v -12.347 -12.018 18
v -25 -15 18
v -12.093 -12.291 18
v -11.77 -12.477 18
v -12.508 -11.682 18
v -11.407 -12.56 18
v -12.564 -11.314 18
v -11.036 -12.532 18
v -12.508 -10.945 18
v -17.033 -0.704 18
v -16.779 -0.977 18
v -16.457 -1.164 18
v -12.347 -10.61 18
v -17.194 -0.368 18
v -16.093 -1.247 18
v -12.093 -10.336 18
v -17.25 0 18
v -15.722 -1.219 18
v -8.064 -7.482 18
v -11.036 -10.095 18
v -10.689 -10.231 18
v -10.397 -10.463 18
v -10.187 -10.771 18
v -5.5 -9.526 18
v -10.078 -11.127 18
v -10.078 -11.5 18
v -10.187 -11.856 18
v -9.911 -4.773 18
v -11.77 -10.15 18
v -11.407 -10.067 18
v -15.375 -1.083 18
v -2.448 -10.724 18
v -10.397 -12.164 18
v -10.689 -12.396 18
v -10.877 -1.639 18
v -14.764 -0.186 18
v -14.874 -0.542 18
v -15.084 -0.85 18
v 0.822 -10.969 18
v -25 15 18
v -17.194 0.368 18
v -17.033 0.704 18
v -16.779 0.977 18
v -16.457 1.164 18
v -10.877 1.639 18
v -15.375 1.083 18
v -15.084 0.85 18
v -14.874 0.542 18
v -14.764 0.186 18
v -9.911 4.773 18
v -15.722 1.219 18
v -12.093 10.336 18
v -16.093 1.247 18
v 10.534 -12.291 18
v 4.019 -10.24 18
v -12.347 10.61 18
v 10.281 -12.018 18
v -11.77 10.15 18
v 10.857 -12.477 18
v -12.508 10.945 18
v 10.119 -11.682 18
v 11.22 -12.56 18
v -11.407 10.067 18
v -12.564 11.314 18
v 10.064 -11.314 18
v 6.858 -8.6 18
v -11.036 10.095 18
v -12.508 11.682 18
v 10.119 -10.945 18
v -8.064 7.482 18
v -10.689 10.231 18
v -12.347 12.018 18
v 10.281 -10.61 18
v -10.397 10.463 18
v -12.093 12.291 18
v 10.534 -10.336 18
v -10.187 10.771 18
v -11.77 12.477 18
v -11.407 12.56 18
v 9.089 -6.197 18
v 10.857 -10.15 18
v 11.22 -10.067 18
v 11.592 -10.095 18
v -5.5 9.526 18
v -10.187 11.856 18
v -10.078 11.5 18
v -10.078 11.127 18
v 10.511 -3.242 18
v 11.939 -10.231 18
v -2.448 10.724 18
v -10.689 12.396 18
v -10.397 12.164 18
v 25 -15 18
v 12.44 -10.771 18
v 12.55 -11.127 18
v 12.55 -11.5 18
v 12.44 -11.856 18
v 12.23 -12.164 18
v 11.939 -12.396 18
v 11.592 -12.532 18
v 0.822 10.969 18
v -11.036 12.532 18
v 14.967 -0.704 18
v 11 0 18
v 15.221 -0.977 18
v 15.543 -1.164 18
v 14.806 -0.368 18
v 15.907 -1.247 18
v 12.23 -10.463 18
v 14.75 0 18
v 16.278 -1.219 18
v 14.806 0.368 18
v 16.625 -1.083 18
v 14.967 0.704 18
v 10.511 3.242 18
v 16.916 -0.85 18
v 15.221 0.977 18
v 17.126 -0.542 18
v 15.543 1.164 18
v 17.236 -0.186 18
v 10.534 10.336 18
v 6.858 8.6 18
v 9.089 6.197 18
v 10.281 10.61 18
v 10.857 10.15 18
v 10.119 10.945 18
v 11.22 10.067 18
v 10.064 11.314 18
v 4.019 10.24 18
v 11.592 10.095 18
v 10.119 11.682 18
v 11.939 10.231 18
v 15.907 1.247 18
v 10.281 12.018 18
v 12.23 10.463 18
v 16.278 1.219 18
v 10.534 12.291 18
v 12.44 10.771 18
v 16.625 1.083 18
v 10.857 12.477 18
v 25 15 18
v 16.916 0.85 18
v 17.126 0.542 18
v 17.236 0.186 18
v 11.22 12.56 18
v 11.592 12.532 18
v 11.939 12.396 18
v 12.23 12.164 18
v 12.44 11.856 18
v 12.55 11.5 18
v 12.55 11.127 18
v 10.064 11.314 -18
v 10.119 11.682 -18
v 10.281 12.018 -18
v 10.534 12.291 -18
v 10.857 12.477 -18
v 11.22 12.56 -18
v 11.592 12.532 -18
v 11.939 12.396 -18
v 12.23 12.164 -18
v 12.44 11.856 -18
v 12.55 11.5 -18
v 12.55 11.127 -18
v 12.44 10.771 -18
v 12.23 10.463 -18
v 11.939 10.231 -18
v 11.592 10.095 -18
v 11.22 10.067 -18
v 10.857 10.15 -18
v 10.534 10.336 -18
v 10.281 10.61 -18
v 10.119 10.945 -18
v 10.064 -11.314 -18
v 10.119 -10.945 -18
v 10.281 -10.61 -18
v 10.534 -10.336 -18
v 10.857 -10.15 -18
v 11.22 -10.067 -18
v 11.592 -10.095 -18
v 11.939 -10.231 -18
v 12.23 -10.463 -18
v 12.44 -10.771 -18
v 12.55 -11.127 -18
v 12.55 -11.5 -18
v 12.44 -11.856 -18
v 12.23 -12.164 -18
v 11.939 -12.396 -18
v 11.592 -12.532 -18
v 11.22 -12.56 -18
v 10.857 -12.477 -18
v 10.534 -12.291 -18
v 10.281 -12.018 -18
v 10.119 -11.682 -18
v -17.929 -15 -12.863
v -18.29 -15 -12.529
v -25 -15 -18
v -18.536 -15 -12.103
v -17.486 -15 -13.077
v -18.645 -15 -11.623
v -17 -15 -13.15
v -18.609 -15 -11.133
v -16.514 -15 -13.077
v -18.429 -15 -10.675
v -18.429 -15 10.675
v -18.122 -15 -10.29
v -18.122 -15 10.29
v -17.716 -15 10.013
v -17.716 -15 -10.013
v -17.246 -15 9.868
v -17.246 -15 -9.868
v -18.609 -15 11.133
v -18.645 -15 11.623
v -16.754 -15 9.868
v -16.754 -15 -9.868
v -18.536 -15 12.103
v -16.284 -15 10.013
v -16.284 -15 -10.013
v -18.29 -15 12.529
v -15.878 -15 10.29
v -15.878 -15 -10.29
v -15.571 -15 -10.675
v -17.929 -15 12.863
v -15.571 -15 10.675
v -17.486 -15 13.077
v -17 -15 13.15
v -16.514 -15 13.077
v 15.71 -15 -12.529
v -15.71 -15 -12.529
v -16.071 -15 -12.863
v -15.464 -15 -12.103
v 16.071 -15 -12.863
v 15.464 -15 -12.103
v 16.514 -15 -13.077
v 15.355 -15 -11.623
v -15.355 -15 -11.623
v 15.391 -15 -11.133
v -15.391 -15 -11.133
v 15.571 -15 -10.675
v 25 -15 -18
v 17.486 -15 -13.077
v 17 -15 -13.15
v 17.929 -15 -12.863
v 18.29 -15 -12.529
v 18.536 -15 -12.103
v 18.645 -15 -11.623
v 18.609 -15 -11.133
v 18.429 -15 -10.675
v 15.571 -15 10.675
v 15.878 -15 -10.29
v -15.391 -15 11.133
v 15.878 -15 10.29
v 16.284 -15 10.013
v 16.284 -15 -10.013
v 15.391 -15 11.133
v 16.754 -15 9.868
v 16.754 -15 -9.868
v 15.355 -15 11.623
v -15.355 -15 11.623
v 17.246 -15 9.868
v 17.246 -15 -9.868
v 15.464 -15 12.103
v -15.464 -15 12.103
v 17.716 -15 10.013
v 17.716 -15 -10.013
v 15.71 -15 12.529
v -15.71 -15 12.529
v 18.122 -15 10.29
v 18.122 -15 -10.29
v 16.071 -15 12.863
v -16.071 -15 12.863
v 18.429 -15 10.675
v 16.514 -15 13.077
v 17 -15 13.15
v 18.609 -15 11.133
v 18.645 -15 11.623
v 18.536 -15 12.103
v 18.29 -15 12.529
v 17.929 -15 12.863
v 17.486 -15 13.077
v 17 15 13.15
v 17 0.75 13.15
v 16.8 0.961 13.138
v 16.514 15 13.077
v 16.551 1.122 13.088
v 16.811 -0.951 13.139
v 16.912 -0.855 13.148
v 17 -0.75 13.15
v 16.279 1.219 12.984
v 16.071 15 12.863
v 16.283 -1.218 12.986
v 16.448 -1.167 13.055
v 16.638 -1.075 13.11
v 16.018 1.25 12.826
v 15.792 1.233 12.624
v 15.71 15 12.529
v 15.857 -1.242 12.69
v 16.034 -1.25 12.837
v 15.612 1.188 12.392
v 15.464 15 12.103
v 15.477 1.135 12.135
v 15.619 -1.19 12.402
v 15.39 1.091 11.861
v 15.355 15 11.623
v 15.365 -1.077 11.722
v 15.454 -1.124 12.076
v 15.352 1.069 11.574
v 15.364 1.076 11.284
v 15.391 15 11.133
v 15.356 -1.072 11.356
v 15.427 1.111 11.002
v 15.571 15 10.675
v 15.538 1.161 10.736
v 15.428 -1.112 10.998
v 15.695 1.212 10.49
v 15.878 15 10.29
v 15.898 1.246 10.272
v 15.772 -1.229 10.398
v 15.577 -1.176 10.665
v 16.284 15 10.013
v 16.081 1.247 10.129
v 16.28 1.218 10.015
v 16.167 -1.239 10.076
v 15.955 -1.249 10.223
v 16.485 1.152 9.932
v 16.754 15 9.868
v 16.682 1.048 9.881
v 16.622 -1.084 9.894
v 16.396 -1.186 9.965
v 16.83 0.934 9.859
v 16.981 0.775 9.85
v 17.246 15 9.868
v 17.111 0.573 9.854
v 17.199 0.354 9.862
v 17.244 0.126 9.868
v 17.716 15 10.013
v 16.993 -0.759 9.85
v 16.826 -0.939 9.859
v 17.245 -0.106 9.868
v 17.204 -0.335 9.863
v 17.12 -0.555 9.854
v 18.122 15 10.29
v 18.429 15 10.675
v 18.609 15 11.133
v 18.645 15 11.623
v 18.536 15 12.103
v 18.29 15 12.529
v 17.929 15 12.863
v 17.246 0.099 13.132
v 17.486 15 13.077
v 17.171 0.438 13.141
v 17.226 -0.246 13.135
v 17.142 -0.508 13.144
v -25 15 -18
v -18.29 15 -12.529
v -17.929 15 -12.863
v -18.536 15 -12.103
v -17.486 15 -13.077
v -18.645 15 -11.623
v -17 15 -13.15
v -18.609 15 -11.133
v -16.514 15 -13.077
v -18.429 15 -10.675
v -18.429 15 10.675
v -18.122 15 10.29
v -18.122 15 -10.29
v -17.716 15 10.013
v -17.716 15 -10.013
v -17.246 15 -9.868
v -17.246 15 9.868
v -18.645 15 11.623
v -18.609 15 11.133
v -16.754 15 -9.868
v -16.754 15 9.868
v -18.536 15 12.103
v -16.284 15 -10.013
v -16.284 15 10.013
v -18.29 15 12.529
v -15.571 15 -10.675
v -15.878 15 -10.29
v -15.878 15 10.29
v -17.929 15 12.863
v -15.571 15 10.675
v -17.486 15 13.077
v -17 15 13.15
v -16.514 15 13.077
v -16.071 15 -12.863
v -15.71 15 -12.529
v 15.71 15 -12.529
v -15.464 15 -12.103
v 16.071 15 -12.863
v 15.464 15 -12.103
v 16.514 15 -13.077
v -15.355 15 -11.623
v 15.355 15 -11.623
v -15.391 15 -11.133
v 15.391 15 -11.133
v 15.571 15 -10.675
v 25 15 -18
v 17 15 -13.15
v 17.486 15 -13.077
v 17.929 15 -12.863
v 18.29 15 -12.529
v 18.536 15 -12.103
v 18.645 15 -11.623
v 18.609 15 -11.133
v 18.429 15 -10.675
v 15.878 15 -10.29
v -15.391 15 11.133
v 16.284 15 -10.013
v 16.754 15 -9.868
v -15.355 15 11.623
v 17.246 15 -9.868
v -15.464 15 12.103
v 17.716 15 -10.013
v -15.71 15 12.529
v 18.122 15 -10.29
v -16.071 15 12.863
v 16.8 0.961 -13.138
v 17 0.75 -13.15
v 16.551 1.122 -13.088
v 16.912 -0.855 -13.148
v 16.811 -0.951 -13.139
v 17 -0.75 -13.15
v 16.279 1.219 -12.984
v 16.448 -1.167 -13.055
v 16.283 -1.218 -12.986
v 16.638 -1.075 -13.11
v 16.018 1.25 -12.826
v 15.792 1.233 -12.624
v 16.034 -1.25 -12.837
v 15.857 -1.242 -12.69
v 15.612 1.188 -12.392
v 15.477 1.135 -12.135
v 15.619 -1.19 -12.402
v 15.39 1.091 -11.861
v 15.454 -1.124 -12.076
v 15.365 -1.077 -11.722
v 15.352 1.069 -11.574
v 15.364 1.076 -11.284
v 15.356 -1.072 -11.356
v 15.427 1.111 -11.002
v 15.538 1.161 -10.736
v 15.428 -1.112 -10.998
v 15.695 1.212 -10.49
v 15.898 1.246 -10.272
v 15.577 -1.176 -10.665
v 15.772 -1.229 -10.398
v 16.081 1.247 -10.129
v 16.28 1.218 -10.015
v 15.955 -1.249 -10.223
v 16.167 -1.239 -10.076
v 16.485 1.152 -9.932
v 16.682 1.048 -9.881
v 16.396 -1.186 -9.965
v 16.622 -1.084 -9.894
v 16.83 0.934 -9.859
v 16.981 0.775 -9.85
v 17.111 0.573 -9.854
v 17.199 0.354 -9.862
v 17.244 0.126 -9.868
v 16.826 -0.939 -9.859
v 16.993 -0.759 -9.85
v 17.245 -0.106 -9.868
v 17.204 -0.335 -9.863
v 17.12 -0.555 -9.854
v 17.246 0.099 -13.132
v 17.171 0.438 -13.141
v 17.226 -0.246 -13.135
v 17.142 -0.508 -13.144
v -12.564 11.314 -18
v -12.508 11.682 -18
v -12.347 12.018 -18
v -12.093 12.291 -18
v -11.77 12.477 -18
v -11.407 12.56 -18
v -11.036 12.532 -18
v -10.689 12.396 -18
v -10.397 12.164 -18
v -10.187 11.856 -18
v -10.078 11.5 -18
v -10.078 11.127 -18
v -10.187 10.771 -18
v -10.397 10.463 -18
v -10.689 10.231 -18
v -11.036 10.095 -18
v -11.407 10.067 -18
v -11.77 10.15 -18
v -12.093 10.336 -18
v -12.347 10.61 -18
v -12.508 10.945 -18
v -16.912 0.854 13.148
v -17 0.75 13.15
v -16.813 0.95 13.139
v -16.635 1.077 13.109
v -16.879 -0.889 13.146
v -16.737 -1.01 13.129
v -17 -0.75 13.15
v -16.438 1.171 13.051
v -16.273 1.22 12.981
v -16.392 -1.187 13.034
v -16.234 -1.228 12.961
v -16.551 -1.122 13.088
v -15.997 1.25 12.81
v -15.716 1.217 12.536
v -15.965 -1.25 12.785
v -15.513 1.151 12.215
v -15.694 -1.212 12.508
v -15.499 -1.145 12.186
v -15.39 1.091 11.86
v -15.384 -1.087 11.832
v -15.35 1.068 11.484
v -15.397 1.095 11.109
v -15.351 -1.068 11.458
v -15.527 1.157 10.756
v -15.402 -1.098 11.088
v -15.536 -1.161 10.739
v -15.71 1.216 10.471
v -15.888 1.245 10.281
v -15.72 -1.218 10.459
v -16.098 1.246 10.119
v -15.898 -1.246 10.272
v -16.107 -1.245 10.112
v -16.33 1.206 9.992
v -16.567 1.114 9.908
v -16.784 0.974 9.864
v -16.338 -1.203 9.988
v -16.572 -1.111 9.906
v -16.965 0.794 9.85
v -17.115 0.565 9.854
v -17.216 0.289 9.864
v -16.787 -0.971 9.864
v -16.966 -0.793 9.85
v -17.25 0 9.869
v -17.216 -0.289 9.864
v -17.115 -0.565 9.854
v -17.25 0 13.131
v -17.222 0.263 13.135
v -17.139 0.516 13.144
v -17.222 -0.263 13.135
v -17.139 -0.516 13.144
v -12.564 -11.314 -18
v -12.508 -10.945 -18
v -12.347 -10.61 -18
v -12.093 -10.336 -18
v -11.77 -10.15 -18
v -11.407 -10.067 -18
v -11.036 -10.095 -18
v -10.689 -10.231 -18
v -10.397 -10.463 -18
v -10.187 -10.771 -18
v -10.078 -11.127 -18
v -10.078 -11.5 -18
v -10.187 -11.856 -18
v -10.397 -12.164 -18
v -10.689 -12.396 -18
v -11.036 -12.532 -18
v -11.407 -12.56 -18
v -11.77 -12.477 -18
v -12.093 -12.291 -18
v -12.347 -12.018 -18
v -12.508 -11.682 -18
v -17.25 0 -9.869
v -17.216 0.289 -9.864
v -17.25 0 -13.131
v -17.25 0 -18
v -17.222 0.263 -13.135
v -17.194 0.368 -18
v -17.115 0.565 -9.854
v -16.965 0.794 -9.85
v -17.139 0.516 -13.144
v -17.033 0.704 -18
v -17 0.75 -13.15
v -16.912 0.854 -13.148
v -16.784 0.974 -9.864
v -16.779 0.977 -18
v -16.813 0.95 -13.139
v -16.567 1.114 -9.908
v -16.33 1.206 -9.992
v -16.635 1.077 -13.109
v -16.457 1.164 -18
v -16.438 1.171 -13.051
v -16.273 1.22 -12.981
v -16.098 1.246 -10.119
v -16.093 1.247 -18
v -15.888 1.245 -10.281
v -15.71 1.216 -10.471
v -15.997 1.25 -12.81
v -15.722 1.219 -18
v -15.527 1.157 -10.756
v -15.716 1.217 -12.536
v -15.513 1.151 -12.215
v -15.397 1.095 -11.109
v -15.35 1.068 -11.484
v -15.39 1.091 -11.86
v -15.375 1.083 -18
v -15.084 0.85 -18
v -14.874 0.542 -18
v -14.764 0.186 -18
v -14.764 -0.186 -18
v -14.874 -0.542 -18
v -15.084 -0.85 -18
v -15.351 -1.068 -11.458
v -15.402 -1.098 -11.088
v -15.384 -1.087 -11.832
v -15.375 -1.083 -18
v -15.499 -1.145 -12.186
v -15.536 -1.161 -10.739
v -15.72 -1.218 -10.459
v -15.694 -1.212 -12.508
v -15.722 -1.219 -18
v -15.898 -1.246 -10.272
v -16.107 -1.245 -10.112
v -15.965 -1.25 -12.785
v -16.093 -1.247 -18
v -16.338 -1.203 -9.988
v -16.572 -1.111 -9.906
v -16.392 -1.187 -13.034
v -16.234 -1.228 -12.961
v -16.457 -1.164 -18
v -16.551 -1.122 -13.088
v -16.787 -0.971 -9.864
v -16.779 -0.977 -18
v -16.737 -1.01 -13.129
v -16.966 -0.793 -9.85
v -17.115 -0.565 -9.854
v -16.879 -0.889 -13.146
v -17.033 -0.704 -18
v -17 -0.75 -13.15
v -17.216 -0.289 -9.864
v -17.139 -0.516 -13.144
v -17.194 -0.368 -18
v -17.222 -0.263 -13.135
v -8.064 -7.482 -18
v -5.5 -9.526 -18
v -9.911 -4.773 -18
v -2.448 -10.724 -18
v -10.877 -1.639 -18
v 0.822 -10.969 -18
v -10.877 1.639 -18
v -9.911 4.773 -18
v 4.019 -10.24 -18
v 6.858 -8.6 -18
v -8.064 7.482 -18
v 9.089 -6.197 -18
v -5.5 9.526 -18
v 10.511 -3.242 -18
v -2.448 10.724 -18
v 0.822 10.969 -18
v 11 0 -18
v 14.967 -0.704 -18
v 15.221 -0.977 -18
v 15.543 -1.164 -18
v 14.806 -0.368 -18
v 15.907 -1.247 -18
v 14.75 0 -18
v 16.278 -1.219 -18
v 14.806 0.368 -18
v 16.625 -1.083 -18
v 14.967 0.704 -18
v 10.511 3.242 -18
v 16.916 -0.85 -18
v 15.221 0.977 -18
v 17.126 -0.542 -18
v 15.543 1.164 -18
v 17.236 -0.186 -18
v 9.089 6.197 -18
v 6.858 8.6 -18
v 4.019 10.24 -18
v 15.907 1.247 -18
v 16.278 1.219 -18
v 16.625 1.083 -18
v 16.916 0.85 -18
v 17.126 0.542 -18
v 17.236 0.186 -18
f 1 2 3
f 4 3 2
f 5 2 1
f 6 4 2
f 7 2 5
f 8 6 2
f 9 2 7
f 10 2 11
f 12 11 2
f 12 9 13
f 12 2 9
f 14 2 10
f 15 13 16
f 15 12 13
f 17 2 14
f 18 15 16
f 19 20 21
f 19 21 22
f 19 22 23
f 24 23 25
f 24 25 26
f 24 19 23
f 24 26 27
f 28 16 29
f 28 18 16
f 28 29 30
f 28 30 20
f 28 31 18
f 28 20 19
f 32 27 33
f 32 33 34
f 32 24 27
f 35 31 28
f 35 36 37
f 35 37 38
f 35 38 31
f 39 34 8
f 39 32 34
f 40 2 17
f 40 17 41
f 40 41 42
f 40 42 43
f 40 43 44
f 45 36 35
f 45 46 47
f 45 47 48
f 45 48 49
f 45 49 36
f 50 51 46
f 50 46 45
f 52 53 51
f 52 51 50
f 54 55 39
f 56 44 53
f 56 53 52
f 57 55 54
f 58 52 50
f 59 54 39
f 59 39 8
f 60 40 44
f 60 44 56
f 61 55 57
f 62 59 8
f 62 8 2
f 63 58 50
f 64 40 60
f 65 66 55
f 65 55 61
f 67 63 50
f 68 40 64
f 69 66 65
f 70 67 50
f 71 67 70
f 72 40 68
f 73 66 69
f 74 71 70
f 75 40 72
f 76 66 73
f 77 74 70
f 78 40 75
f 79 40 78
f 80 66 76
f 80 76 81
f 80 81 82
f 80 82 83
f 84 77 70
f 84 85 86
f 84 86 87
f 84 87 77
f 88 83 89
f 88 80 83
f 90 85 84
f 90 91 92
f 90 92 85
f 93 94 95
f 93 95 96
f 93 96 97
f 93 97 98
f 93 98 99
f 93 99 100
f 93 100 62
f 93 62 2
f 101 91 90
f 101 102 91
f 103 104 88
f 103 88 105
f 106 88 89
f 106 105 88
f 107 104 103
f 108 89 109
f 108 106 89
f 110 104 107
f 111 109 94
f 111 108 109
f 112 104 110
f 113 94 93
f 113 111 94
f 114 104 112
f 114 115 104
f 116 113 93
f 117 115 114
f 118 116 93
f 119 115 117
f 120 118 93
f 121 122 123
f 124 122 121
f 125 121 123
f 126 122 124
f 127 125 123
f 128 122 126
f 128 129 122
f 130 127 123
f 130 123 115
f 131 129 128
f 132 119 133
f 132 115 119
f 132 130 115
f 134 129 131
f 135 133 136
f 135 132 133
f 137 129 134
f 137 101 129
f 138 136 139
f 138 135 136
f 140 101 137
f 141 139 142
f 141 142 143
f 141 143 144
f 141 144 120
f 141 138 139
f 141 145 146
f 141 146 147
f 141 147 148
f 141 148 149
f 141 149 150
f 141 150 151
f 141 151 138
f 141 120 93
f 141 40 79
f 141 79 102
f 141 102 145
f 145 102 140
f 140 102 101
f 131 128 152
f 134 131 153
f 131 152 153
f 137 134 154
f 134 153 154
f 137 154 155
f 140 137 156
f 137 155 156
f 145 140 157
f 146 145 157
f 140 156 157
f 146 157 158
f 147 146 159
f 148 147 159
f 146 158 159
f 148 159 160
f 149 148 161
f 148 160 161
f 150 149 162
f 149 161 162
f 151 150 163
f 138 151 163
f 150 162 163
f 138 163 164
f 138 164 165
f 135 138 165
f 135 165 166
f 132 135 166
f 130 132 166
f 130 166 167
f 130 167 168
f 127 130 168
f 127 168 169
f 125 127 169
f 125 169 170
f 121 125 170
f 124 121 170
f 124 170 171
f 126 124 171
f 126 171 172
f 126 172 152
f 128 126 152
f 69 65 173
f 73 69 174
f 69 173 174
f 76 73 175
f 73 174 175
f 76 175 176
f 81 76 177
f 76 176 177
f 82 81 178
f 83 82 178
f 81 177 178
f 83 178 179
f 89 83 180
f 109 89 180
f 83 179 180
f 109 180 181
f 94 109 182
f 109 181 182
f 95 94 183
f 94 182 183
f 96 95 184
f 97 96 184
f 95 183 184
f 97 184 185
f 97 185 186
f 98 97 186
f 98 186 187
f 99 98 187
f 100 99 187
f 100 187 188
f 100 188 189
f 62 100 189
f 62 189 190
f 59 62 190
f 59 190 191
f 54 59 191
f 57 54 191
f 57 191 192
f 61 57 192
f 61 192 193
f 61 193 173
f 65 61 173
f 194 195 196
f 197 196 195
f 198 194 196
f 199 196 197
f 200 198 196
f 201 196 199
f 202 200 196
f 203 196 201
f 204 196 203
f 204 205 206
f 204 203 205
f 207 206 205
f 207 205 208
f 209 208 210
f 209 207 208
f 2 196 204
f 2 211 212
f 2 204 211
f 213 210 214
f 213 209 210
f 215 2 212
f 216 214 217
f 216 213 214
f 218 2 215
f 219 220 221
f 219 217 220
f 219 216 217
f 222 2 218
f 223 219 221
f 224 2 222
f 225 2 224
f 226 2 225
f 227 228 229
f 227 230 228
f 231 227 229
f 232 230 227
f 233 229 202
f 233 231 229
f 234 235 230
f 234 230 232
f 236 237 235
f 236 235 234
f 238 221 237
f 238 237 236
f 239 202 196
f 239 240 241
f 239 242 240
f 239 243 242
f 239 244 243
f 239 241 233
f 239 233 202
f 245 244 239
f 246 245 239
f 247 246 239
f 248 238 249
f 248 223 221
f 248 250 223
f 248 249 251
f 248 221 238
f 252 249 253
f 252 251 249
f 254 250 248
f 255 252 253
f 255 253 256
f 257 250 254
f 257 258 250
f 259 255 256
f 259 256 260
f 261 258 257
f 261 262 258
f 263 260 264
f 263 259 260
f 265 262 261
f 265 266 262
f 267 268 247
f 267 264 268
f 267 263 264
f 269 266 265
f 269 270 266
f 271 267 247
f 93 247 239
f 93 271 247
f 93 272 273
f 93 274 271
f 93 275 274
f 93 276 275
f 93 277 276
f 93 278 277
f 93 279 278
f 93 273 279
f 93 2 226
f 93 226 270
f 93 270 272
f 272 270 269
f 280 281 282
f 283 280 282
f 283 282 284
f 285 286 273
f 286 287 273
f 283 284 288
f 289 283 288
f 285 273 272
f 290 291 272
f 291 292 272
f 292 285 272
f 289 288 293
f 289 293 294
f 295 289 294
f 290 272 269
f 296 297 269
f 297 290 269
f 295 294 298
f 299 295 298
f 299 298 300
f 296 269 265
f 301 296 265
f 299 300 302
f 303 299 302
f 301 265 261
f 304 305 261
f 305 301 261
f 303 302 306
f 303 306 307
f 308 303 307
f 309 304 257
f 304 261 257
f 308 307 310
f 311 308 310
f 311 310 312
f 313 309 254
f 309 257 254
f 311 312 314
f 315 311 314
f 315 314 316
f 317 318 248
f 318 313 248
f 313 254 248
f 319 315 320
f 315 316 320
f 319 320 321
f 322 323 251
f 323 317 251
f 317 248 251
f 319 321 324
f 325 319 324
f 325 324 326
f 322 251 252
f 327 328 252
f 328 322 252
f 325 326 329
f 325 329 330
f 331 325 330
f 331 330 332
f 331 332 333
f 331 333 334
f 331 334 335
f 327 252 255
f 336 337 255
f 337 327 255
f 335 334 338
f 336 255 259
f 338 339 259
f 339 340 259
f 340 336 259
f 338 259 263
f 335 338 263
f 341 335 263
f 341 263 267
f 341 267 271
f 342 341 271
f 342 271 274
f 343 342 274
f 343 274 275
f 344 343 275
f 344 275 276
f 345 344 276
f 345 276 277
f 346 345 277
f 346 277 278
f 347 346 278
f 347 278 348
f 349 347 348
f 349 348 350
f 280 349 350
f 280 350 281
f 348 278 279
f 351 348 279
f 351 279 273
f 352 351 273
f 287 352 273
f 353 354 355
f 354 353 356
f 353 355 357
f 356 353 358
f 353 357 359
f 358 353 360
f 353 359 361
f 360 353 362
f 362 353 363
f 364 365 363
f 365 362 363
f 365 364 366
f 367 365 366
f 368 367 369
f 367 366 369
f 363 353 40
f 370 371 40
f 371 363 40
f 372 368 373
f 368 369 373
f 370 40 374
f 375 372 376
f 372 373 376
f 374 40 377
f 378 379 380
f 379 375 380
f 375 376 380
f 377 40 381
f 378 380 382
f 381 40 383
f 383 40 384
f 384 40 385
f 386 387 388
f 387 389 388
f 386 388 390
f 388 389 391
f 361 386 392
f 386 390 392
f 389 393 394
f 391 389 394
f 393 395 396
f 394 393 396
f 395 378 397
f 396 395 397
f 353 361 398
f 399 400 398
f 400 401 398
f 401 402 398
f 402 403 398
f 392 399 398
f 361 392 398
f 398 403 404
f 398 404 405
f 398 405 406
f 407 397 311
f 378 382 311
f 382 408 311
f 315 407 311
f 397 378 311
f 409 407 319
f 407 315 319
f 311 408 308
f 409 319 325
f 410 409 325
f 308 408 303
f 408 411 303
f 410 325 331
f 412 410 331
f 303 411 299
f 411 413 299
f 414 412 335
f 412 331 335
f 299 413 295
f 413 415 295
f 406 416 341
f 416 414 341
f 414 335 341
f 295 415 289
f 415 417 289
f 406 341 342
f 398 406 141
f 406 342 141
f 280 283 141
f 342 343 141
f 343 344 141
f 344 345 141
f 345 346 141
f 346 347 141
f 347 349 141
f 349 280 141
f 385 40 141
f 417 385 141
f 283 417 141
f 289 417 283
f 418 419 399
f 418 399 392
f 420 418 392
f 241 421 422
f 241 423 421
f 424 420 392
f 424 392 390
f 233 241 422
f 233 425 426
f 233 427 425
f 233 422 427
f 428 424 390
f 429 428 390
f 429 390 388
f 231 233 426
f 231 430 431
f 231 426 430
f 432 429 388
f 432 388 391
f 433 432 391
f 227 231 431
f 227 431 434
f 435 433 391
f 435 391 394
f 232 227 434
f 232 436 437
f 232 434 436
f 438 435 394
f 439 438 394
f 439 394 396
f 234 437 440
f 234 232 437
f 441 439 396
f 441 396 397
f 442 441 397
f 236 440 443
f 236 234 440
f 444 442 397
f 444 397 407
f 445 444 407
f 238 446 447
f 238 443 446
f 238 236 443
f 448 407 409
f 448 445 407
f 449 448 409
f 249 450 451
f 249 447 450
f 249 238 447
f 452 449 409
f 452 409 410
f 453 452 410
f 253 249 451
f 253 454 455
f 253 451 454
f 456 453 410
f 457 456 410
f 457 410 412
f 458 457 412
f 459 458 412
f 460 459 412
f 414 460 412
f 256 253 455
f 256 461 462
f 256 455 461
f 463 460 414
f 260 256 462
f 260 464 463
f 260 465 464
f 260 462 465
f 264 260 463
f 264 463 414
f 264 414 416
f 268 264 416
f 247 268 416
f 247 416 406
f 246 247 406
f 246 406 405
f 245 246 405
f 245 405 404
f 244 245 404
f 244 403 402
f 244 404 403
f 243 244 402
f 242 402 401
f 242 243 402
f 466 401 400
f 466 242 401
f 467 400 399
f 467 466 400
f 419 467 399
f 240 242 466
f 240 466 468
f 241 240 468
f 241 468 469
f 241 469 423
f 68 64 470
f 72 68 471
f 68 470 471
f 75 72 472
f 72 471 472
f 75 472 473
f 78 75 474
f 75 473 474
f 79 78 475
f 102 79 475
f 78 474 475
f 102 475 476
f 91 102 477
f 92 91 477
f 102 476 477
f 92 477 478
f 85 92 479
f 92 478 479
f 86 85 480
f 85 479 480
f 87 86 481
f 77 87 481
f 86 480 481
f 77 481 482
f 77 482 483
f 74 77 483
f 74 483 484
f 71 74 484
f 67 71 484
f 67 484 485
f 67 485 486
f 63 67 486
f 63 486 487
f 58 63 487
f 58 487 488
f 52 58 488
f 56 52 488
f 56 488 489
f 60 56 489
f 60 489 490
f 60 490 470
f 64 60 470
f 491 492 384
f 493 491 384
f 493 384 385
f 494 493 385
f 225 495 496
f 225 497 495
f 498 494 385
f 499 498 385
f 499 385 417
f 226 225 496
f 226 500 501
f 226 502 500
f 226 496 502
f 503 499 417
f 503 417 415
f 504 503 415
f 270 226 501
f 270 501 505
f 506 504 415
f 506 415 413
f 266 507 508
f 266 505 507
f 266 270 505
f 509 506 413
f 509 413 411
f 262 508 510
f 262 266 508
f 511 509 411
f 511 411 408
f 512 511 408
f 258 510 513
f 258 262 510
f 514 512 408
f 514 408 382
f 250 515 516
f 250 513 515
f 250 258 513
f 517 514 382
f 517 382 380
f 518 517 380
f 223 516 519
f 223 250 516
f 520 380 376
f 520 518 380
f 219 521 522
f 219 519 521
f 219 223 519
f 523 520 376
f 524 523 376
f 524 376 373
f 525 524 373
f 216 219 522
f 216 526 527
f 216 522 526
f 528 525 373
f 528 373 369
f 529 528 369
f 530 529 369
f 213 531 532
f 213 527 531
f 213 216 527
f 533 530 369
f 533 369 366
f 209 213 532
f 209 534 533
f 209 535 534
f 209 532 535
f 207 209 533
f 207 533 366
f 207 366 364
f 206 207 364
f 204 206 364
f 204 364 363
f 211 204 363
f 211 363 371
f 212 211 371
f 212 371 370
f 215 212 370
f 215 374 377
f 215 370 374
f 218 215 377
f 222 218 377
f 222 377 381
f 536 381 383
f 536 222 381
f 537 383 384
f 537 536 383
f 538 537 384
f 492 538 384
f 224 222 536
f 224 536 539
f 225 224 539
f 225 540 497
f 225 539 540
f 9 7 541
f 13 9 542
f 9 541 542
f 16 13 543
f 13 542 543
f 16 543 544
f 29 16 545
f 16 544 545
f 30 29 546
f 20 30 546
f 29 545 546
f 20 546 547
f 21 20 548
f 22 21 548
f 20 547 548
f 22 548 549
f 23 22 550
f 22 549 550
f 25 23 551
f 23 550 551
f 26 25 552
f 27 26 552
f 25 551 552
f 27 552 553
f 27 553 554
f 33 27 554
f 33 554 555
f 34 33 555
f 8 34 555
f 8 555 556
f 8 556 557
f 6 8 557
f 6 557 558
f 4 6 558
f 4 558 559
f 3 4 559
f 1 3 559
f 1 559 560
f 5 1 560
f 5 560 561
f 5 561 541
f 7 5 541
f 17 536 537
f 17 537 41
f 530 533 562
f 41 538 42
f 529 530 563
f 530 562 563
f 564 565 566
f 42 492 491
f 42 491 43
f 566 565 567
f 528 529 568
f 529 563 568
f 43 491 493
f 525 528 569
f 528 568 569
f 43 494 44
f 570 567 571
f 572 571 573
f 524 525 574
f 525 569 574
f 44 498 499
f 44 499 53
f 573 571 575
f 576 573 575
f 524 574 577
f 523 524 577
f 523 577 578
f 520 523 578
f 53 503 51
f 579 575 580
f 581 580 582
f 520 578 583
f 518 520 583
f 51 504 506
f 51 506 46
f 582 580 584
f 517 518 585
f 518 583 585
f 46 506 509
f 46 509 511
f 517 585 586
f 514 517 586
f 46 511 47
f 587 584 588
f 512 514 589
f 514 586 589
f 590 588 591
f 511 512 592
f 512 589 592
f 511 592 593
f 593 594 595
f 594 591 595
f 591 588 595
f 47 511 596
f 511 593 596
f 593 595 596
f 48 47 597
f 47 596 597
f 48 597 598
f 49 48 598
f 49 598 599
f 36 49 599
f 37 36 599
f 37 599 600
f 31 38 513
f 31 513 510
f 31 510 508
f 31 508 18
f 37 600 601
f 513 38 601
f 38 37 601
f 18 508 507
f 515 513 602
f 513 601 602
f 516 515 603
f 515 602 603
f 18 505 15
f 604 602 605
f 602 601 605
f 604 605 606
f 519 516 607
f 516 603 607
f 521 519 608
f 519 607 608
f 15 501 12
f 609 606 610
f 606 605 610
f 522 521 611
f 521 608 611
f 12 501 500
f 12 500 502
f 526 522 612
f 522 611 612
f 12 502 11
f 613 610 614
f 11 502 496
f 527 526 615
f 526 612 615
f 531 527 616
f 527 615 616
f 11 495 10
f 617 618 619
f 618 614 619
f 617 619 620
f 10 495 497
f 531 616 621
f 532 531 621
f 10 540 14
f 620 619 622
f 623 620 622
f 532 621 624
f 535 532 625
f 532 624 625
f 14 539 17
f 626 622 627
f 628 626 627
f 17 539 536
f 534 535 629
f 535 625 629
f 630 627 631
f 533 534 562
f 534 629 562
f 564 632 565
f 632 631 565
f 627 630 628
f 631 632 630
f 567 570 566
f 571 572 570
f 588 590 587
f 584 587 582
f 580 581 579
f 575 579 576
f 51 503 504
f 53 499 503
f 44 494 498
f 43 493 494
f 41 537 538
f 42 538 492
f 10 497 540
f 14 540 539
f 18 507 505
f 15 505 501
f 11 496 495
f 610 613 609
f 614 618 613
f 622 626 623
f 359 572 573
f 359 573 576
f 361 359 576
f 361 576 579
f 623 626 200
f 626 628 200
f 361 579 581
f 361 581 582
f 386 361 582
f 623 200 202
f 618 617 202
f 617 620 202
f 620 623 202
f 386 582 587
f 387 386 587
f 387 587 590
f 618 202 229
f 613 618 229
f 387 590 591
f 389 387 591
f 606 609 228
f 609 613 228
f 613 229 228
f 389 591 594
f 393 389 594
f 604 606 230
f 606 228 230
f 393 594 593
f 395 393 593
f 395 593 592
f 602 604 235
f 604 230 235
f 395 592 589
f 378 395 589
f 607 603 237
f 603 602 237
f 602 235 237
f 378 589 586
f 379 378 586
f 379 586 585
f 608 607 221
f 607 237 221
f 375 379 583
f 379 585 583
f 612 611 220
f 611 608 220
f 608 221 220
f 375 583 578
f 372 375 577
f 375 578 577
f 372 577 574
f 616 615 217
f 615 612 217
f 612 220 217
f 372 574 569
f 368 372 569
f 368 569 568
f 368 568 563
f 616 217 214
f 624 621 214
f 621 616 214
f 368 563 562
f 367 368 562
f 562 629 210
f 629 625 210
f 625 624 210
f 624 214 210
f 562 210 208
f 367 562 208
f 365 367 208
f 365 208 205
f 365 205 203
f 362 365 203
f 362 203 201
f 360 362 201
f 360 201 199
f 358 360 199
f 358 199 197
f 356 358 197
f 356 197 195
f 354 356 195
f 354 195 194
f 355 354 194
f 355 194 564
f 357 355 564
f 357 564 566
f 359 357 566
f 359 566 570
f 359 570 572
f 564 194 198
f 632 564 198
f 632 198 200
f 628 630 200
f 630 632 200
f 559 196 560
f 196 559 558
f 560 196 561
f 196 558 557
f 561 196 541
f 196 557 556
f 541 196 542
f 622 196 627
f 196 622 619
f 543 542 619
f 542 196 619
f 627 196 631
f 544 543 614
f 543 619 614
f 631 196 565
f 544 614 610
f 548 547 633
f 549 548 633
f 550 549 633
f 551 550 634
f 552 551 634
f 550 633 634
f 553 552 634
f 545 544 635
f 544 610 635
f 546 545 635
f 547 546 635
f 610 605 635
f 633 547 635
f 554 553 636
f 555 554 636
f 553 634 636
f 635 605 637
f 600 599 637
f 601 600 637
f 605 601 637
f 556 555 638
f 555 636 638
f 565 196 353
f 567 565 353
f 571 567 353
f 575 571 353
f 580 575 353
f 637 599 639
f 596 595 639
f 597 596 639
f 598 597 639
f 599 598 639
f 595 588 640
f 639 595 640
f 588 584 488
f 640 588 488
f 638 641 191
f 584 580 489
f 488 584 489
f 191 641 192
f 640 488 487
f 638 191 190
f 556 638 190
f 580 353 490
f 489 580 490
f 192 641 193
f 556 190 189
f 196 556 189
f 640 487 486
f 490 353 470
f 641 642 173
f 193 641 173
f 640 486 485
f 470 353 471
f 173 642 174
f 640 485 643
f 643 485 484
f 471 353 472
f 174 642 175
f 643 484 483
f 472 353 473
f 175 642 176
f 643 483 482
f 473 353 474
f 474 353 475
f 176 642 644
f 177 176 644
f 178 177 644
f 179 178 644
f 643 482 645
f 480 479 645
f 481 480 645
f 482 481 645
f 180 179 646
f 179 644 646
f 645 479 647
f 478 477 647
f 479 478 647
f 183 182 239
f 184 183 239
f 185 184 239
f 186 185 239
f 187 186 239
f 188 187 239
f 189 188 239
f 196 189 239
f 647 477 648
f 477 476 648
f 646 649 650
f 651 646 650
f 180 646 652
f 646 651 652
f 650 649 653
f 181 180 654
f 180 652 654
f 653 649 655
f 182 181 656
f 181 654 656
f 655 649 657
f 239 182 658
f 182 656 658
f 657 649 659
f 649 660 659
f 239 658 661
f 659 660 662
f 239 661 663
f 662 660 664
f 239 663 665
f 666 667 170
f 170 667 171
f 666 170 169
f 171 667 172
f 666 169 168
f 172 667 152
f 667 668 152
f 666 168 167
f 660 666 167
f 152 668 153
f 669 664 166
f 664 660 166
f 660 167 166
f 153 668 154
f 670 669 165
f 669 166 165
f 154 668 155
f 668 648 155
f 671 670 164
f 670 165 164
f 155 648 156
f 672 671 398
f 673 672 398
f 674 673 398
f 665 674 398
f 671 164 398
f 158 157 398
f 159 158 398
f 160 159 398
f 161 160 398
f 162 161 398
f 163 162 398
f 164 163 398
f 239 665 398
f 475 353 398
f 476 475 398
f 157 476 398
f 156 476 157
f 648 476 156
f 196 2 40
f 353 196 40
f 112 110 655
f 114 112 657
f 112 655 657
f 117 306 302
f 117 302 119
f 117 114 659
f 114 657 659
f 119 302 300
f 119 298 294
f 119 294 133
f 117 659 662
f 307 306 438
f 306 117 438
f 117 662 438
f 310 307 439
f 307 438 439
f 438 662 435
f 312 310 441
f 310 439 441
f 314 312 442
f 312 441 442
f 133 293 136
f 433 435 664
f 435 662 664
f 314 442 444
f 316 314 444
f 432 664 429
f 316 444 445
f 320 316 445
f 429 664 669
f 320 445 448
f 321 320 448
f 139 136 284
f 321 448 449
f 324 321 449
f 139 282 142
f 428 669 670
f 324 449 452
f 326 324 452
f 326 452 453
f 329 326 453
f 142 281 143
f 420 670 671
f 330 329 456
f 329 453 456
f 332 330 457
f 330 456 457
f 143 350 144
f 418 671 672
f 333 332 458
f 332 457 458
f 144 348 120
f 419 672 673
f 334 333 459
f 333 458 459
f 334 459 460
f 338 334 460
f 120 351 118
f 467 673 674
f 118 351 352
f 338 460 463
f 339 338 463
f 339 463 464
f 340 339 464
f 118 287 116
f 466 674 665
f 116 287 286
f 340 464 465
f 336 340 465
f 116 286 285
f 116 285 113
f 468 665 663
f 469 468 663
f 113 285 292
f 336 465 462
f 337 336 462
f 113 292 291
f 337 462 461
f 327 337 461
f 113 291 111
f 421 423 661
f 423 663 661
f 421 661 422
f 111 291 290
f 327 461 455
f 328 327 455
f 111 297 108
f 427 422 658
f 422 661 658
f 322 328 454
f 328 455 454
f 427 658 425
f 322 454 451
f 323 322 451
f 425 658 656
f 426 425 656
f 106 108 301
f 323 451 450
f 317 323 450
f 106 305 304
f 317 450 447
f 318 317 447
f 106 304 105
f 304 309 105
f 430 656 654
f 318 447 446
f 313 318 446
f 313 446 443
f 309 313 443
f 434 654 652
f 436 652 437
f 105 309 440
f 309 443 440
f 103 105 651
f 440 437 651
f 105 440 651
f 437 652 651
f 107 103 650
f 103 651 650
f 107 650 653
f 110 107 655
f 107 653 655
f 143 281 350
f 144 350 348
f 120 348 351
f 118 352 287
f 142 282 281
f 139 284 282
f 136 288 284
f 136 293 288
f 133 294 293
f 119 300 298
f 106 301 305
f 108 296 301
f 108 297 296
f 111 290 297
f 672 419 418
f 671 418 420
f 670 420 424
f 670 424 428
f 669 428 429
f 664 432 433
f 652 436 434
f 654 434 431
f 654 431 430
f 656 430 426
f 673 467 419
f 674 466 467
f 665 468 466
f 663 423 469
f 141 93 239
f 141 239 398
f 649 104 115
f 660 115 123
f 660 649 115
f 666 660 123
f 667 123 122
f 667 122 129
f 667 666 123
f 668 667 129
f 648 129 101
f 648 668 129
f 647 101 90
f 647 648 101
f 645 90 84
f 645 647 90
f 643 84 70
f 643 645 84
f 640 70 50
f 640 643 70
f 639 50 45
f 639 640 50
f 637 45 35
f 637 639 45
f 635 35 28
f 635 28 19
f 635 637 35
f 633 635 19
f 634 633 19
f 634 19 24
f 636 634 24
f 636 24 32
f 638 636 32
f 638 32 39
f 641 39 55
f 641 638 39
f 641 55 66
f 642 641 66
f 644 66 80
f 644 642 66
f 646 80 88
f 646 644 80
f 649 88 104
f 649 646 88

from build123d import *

# Parameters (mm, degrees)
SKETCH_1_W         = 50
SKETCH_1_H         = 30
SKETCH_1_R         = 11
EXTRUDE_1_DEPTH    = 18
HOLE_WIZARD_M3_1_D = 2.5
HOLE_WIZARD_M4_1_D = 3.3
MIRROR_2_COPY_1_D  = 3.3


with BuildPart() as part:
    # 草图1 → 凸台-拉伸1 (new, symmetric)
    with BuildSketch(Plane.XY):
        Rectangle(SKETCH_1_W, SKETCH_1_H)
        Circle(SKETCH_1_R, mode=Mode.SUBTRACT)
    extrude(amount=EXTRUDE_1_DEPTH, both=True)

    # M3 螺纹孔的螺纹孔钻头1 (through all)
    with Locations(Plane(origin=(-16, 0, 18), x_dir=(1, 0, 0), z_dir=(0, 0, 1))):
        with Locations((0, 0), (4.686291501, 11.313708499), (27.313708499, 11.313708499), (32, 0), (27.313708499, -11.313708499), (4.686291501, -11.313708499)):
            Hole(HOLE_WIZARD_M3_1_D / 2)

    # M4 螺纹孔的螺纹孔钻头1 (through all)
    with Locations(Plane(origin=(-17, 15, -11.5), x_dir=(0, 0, 1), z_dir=(0, 1, 0))):
        with Locations((0, 0)):
            hole_wizard_m4_1 = Hole(HOLE_WIZARD_M4_1_D / 2)

    # 镜向1: M4 螺纹孔的螺纹孔钻头1 across plane
    add(hole_wizard_m4_1.mirror(Plane(origin=(0, 0, 0), x_dir=(0, 0, 1), z_dir=(1, 0, 0))), mode=Mode.SUBTRACT)

    # 镜向2: M4 螺纹孔的螺纹孔钻头1 across plane
    add(hole_wizard_m4_1.mirror(Plane.XY), mode=Mode.SUBTRACT)

    # 镜向2 copy 1 (through all)
    with Locations(Plane(origin=(17, 15, 11.5), x_dir=(0, 0, -1), z_dir=(0, 1, 0))):
        with Locations((0, 0)):
            Hole(MIRROR_2_COPY_1_D / 2)


solid = part.part
